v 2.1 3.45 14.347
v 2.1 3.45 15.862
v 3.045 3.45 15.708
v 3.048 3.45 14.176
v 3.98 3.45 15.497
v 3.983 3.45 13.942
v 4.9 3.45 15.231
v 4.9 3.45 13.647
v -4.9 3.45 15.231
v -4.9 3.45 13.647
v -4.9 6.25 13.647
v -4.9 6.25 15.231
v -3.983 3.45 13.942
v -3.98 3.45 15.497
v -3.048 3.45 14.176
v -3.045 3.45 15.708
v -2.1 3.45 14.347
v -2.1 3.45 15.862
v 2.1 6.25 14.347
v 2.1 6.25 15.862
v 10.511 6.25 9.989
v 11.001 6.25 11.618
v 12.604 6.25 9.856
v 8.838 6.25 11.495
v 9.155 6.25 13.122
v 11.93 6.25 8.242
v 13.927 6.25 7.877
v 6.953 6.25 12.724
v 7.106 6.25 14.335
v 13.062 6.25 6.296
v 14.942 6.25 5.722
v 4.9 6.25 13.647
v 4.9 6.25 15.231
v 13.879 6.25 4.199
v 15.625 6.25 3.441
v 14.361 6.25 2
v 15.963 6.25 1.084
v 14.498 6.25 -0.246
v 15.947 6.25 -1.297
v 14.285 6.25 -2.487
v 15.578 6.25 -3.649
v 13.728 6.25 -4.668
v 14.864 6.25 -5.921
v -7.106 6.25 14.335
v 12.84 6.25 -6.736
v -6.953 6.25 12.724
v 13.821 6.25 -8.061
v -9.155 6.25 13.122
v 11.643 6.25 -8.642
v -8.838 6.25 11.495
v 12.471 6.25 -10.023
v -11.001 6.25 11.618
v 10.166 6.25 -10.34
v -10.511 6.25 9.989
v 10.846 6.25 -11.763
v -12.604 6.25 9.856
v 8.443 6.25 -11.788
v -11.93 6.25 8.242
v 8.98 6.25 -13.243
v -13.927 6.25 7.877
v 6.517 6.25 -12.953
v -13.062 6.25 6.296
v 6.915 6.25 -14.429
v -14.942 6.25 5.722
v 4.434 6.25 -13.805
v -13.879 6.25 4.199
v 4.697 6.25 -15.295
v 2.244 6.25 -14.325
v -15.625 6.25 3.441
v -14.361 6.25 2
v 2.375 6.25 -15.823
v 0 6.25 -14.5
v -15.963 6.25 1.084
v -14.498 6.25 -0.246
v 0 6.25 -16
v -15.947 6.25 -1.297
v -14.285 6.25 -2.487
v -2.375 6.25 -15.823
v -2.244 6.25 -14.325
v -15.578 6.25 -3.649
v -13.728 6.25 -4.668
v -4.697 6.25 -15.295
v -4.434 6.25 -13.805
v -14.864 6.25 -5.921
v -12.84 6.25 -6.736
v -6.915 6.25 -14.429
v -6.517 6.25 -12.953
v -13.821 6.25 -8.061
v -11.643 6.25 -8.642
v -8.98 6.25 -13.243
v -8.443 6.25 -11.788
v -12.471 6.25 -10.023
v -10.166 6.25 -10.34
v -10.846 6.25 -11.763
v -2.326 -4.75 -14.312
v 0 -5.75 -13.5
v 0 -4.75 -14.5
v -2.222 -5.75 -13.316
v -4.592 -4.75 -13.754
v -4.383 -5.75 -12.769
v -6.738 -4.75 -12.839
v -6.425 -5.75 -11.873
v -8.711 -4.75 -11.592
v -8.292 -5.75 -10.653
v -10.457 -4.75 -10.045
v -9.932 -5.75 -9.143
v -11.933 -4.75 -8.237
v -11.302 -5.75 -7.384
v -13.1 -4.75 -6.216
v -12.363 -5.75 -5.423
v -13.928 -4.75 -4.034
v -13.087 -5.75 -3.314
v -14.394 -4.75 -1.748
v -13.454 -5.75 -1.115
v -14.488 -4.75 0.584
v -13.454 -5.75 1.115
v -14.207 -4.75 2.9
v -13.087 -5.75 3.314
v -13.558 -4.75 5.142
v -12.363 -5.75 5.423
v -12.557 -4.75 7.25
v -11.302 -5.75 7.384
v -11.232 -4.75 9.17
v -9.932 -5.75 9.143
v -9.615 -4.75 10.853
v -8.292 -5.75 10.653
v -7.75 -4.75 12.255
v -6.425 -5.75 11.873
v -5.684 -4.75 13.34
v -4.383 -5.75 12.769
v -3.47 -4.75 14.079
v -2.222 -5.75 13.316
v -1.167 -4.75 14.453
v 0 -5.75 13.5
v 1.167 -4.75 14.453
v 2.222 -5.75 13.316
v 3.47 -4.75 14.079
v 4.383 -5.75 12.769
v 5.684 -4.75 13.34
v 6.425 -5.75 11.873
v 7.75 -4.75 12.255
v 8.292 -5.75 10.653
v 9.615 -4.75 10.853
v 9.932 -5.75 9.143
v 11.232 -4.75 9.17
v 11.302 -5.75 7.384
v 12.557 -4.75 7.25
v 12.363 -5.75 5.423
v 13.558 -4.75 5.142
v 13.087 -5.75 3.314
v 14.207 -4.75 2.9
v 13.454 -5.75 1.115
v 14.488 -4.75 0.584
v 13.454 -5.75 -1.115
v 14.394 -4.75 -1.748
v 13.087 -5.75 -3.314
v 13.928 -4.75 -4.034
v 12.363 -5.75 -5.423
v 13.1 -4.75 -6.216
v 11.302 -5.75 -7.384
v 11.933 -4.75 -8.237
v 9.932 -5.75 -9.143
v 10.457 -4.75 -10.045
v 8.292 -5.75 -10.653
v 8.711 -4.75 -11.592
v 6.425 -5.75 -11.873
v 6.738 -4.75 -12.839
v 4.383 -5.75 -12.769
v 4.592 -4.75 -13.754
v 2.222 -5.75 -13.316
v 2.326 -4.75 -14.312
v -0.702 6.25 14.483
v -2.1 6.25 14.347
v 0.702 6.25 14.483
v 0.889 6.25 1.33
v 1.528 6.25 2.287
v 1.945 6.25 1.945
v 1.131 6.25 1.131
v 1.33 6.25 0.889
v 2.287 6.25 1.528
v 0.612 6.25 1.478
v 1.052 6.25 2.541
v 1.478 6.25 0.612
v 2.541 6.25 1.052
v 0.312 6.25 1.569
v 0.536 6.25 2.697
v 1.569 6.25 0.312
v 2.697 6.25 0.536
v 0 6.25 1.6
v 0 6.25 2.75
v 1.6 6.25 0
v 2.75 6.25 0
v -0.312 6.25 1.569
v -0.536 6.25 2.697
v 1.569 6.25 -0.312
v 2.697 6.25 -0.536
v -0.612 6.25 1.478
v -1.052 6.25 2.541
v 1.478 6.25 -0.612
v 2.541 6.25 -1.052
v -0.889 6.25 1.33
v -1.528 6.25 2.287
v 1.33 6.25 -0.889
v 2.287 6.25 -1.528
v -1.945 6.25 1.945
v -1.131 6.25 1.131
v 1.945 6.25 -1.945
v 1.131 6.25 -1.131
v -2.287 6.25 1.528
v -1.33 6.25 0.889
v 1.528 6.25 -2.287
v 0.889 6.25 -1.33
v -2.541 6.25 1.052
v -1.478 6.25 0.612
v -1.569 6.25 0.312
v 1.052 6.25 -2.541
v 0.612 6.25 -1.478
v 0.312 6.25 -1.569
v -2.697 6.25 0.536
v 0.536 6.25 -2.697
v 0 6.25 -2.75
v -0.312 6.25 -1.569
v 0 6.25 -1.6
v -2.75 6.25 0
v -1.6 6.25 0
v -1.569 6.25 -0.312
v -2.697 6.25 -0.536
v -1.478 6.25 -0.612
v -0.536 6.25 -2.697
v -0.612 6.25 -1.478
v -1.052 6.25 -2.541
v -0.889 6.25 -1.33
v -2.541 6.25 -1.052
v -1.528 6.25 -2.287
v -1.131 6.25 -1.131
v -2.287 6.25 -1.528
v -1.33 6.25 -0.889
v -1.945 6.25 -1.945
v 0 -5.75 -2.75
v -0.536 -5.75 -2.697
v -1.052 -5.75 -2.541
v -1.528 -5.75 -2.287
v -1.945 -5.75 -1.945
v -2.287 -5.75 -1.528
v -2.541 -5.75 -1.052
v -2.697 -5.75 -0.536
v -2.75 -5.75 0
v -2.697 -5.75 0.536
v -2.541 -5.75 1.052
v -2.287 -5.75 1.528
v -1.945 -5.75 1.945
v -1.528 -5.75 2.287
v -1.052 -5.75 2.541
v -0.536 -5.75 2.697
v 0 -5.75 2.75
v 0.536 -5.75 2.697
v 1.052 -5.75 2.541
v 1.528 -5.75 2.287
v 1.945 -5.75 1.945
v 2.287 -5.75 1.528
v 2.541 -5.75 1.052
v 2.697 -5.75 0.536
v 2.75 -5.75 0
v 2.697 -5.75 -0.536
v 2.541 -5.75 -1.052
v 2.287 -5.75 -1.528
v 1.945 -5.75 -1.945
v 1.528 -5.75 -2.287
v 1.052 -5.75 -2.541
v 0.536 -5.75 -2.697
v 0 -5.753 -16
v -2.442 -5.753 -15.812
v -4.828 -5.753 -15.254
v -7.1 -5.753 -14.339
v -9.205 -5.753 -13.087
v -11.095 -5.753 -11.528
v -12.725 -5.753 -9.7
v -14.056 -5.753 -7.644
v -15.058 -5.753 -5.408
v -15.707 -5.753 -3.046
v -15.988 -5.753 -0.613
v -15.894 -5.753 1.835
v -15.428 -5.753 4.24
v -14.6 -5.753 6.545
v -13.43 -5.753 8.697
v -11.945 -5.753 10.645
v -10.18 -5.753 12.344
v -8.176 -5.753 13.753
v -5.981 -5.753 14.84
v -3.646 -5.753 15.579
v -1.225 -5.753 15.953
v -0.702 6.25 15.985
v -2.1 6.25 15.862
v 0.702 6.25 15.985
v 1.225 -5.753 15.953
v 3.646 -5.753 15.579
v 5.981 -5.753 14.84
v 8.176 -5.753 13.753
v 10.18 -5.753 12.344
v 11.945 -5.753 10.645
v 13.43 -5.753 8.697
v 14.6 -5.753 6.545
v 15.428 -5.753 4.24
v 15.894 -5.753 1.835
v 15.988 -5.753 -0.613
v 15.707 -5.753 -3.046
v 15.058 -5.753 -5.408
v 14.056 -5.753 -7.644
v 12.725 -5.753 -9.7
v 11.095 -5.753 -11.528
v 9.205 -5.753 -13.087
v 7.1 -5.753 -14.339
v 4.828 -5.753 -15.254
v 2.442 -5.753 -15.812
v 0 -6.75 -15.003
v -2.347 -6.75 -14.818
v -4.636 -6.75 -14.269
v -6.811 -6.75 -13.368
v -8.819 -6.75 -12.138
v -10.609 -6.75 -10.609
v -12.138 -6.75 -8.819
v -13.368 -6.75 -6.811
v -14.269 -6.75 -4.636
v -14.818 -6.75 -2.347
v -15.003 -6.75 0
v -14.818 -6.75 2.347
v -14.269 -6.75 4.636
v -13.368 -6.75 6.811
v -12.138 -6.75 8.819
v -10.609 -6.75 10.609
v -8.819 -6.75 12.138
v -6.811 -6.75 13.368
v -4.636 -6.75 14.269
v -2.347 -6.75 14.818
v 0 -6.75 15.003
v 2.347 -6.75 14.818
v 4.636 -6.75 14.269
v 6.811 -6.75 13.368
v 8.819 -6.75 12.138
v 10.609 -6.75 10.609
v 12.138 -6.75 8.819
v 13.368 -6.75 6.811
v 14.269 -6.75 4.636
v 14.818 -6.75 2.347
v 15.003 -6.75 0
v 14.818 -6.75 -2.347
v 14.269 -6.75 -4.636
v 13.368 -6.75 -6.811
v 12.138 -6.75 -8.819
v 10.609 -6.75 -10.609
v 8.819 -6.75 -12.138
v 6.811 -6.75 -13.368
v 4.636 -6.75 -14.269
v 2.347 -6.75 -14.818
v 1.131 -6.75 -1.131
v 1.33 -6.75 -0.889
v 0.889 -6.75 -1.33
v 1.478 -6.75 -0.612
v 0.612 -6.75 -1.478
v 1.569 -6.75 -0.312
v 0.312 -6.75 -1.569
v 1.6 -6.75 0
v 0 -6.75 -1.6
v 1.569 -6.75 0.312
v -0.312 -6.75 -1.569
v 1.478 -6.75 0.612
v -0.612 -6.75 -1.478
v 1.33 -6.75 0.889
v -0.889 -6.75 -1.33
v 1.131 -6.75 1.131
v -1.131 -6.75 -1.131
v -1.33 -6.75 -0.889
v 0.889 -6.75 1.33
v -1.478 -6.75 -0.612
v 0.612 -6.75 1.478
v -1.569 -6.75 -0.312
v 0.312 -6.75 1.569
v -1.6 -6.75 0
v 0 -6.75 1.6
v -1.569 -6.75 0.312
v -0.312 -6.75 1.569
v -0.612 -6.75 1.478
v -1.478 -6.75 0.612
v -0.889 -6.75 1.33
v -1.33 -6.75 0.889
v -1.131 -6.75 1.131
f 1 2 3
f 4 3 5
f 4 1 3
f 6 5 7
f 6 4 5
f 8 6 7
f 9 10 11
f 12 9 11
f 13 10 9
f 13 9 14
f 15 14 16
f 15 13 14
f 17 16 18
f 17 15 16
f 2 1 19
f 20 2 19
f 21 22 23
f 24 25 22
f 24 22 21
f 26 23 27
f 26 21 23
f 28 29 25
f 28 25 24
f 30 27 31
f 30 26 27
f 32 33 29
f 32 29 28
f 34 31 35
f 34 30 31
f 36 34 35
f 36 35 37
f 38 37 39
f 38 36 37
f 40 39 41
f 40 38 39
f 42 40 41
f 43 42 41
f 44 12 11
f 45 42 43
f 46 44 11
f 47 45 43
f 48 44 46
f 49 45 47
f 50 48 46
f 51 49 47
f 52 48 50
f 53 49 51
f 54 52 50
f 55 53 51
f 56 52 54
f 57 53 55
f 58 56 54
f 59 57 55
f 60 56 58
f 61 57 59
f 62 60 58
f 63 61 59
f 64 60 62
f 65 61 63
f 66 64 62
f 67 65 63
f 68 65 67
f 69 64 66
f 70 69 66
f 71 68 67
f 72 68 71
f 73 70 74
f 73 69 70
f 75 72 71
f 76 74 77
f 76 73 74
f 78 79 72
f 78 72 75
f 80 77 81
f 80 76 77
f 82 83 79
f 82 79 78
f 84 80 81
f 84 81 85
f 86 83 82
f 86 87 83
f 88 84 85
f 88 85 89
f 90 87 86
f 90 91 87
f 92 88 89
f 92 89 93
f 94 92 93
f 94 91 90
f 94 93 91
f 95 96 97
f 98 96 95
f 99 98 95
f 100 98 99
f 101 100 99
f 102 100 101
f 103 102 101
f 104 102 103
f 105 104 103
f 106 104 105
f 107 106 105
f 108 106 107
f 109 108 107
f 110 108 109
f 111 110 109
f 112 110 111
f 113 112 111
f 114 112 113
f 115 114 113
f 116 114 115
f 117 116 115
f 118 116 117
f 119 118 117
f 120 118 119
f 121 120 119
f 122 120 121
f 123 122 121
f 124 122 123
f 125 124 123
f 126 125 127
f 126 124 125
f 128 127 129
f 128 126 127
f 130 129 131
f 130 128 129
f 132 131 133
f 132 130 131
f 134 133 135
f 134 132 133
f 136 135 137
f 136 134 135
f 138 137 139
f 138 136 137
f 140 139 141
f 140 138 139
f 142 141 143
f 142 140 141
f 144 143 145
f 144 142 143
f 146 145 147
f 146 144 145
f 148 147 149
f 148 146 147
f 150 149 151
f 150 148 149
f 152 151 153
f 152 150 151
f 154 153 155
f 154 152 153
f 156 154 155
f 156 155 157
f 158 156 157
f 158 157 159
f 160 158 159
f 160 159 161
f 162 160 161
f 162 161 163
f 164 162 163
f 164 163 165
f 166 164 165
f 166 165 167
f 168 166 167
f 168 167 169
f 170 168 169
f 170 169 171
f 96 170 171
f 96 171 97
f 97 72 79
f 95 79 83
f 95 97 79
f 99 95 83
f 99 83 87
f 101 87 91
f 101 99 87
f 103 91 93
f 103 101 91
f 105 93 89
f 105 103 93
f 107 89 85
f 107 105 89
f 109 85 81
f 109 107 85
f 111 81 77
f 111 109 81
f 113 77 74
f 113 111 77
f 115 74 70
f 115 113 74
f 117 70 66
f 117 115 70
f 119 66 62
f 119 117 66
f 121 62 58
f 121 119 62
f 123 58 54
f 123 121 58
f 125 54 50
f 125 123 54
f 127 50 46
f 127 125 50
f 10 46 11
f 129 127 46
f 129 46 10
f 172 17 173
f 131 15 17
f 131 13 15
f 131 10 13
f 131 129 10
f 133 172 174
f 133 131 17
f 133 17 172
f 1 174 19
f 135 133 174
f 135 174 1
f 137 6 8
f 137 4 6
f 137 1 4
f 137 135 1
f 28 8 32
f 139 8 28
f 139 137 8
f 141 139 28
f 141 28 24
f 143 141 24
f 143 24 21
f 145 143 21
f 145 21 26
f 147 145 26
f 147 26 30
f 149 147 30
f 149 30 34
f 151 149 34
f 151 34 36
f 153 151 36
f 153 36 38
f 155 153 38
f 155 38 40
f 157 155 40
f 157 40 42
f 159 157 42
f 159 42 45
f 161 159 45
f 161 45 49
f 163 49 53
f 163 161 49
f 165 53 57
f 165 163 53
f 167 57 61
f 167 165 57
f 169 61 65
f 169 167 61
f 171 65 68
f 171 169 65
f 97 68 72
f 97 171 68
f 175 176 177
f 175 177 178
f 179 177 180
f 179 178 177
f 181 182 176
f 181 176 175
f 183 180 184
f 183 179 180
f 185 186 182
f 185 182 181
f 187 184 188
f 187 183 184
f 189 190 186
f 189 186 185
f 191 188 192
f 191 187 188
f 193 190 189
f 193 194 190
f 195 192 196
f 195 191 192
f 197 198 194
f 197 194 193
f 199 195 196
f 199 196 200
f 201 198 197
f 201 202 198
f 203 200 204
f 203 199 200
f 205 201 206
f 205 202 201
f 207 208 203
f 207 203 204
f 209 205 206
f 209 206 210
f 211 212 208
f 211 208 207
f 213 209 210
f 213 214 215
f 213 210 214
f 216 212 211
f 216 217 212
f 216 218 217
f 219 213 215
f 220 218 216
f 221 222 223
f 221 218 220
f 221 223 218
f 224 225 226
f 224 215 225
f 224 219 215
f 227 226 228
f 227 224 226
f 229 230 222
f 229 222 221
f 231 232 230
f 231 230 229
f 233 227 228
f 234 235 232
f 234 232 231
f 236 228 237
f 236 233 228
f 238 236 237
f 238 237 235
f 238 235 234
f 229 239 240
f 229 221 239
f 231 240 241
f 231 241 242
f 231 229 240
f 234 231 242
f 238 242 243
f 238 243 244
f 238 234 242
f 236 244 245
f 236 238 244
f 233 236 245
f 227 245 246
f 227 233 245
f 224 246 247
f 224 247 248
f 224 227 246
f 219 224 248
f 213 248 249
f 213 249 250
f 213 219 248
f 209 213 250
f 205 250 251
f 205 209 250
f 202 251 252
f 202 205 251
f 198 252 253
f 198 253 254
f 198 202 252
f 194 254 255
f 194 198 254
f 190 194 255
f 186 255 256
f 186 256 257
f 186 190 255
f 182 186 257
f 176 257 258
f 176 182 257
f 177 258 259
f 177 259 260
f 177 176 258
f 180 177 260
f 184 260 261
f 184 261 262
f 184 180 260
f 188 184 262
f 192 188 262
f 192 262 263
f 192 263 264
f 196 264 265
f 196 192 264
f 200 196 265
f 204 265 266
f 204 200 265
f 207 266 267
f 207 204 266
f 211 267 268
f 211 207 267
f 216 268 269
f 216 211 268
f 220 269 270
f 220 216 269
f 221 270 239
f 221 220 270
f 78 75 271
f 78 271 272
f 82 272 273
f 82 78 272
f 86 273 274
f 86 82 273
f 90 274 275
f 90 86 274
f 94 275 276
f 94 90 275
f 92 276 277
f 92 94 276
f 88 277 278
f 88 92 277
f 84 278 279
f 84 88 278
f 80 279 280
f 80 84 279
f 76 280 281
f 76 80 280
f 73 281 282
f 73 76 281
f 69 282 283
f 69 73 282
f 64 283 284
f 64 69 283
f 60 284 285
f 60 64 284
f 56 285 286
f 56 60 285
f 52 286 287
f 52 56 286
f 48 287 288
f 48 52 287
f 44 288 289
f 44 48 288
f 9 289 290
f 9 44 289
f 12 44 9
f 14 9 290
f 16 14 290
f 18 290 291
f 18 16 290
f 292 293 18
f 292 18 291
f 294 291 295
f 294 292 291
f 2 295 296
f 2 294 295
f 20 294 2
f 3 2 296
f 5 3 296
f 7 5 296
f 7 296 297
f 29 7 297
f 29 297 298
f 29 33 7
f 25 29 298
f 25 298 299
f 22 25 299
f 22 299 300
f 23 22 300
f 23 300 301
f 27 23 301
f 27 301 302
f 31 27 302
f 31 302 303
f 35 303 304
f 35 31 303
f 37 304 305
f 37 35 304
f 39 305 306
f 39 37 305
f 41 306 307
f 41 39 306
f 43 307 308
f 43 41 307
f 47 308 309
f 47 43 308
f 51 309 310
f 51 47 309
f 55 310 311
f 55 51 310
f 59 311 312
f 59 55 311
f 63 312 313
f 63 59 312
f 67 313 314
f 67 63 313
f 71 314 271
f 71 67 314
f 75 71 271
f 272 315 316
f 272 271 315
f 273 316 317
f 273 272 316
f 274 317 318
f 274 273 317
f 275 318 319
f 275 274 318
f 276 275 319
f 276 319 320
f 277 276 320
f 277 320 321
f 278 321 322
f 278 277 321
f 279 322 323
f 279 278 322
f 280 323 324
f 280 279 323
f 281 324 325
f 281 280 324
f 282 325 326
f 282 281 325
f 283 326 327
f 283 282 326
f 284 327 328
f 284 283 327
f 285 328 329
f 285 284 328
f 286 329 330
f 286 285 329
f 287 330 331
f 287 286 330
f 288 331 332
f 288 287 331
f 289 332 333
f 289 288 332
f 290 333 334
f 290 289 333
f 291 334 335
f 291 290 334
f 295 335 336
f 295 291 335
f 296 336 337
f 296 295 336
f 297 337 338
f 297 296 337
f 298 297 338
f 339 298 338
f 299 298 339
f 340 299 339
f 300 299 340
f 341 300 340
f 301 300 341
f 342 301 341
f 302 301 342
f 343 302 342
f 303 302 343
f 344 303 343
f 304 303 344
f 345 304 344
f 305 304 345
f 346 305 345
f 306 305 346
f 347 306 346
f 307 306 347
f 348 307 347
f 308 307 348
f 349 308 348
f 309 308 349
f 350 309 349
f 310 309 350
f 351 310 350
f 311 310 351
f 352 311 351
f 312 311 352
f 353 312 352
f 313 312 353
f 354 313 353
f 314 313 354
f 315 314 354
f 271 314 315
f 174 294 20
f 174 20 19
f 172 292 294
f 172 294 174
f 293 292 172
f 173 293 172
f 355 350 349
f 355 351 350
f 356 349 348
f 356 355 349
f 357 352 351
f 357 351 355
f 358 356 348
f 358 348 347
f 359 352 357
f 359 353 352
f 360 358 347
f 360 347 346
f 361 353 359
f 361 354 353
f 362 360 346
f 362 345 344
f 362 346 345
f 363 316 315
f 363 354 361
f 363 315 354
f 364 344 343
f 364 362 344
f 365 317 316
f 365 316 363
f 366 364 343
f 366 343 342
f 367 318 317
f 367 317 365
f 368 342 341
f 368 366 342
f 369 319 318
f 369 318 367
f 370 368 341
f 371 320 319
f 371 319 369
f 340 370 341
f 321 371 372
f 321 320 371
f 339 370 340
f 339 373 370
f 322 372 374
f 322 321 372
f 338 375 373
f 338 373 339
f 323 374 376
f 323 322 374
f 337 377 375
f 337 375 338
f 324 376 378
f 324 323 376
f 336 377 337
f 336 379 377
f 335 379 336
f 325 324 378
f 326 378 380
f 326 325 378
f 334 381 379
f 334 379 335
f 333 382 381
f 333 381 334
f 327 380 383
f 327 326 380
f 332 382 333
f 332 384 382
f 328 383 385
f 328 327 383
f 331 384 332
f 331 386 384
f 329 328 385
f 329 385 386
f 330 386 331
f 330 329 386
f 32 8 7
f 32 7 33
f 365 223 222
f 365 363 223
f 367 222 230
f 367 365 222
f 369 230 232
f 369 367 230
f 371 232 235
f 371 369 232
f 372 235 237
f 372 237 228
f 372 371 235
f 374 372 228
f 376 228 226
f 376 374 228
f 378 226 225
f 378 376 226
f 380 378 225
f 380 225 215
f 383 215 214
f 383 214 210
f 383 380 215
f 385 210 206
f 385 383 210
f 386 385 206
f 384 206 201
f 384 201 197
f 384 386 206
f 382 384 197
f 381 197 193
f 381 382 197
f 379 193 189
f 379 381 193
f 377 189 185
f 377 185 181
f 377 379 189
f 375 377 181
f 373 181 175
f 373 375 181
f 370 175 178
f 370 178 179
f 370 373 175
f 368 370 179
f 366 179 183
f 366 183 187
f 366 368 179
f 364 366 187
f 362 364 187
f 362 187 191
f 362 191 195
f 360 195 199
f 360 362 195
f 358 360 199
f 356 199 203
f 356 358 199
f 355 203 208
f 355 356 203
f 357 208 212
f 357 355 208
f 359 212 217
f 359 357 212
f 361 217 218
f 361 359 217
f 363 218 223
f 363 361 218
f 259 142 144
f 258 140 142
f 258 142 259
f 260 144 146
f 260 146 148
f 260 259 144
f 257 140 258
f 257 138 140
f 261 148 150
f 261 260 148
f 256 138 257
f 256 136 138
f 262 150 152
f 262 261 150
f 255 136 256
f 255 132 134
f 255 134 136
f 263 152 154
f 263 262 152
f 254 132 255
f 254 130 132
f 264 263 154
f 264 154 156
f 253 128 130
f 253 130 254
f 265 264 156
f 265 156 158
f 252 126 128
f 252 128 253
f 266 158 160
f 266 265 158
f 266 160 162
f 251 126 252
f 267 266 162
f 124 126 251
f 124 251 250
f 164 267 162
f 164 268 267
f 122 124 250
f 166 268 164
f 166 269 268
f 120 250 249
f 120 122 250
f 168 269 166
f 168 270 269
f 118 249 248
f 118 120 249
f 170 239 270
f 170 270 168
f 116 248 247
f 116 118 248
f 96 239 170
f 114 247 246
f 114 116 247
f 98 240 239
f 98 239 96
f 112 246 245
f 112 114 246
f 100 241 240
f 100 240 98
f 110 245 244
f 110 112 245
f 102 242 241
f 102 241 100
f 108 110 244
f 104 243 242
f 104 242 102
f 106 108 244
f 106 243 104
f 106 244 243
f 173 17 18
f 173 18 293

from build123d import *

# Parameters (mm, degrees)
CUT_EXTRUDE1_START = 10
SKETCH2_W          = 2.8
SKETCH2_H          = 2.8
CUT_EXTRUDE1_DEPTH = 10


with BuildPart() as part:
    # Sketch1 → Revolve1 (revolve)
    with BuildSketch(Plane.XY, mode=Mode.PRIVATE) as revolve1_sk:
        Polygon((-14.5, 6.25), (-14.5, -4.75), (-13.5, -5.75), (-2.75, -5.75), (-2.75, 6.25), (-1.6, 6.25), (-1.6, -6.75), (-15.002979439, -6.75), (-16, -5.752979439), (-16, 6.25), align=None)
    revolve(revolve1_sk.sketch.rotate(Axis((0, 0, 0), (0, 1, 0)), 270), axis=Axis((0, 0, 0), (0, 1, 0)))

    # Sketch2 → Cut-Extrude1 (cut)
    with BuildSketch(Plane.XY.offset(CUT_EXTRUDE1_START)):
        with Locations((-3.5, 4.85)):
            Rectangle(SKETCH2_W, SKETCH2_H)
        with Locations((3.5, 4.85)):
            Rectangle(SKETCH2_W, SKETCH2_H)
    extrude(amount=CUT_EXTRUDE1_DEPTH, mode=Mode.SUBTRACT)


solid = part.part
